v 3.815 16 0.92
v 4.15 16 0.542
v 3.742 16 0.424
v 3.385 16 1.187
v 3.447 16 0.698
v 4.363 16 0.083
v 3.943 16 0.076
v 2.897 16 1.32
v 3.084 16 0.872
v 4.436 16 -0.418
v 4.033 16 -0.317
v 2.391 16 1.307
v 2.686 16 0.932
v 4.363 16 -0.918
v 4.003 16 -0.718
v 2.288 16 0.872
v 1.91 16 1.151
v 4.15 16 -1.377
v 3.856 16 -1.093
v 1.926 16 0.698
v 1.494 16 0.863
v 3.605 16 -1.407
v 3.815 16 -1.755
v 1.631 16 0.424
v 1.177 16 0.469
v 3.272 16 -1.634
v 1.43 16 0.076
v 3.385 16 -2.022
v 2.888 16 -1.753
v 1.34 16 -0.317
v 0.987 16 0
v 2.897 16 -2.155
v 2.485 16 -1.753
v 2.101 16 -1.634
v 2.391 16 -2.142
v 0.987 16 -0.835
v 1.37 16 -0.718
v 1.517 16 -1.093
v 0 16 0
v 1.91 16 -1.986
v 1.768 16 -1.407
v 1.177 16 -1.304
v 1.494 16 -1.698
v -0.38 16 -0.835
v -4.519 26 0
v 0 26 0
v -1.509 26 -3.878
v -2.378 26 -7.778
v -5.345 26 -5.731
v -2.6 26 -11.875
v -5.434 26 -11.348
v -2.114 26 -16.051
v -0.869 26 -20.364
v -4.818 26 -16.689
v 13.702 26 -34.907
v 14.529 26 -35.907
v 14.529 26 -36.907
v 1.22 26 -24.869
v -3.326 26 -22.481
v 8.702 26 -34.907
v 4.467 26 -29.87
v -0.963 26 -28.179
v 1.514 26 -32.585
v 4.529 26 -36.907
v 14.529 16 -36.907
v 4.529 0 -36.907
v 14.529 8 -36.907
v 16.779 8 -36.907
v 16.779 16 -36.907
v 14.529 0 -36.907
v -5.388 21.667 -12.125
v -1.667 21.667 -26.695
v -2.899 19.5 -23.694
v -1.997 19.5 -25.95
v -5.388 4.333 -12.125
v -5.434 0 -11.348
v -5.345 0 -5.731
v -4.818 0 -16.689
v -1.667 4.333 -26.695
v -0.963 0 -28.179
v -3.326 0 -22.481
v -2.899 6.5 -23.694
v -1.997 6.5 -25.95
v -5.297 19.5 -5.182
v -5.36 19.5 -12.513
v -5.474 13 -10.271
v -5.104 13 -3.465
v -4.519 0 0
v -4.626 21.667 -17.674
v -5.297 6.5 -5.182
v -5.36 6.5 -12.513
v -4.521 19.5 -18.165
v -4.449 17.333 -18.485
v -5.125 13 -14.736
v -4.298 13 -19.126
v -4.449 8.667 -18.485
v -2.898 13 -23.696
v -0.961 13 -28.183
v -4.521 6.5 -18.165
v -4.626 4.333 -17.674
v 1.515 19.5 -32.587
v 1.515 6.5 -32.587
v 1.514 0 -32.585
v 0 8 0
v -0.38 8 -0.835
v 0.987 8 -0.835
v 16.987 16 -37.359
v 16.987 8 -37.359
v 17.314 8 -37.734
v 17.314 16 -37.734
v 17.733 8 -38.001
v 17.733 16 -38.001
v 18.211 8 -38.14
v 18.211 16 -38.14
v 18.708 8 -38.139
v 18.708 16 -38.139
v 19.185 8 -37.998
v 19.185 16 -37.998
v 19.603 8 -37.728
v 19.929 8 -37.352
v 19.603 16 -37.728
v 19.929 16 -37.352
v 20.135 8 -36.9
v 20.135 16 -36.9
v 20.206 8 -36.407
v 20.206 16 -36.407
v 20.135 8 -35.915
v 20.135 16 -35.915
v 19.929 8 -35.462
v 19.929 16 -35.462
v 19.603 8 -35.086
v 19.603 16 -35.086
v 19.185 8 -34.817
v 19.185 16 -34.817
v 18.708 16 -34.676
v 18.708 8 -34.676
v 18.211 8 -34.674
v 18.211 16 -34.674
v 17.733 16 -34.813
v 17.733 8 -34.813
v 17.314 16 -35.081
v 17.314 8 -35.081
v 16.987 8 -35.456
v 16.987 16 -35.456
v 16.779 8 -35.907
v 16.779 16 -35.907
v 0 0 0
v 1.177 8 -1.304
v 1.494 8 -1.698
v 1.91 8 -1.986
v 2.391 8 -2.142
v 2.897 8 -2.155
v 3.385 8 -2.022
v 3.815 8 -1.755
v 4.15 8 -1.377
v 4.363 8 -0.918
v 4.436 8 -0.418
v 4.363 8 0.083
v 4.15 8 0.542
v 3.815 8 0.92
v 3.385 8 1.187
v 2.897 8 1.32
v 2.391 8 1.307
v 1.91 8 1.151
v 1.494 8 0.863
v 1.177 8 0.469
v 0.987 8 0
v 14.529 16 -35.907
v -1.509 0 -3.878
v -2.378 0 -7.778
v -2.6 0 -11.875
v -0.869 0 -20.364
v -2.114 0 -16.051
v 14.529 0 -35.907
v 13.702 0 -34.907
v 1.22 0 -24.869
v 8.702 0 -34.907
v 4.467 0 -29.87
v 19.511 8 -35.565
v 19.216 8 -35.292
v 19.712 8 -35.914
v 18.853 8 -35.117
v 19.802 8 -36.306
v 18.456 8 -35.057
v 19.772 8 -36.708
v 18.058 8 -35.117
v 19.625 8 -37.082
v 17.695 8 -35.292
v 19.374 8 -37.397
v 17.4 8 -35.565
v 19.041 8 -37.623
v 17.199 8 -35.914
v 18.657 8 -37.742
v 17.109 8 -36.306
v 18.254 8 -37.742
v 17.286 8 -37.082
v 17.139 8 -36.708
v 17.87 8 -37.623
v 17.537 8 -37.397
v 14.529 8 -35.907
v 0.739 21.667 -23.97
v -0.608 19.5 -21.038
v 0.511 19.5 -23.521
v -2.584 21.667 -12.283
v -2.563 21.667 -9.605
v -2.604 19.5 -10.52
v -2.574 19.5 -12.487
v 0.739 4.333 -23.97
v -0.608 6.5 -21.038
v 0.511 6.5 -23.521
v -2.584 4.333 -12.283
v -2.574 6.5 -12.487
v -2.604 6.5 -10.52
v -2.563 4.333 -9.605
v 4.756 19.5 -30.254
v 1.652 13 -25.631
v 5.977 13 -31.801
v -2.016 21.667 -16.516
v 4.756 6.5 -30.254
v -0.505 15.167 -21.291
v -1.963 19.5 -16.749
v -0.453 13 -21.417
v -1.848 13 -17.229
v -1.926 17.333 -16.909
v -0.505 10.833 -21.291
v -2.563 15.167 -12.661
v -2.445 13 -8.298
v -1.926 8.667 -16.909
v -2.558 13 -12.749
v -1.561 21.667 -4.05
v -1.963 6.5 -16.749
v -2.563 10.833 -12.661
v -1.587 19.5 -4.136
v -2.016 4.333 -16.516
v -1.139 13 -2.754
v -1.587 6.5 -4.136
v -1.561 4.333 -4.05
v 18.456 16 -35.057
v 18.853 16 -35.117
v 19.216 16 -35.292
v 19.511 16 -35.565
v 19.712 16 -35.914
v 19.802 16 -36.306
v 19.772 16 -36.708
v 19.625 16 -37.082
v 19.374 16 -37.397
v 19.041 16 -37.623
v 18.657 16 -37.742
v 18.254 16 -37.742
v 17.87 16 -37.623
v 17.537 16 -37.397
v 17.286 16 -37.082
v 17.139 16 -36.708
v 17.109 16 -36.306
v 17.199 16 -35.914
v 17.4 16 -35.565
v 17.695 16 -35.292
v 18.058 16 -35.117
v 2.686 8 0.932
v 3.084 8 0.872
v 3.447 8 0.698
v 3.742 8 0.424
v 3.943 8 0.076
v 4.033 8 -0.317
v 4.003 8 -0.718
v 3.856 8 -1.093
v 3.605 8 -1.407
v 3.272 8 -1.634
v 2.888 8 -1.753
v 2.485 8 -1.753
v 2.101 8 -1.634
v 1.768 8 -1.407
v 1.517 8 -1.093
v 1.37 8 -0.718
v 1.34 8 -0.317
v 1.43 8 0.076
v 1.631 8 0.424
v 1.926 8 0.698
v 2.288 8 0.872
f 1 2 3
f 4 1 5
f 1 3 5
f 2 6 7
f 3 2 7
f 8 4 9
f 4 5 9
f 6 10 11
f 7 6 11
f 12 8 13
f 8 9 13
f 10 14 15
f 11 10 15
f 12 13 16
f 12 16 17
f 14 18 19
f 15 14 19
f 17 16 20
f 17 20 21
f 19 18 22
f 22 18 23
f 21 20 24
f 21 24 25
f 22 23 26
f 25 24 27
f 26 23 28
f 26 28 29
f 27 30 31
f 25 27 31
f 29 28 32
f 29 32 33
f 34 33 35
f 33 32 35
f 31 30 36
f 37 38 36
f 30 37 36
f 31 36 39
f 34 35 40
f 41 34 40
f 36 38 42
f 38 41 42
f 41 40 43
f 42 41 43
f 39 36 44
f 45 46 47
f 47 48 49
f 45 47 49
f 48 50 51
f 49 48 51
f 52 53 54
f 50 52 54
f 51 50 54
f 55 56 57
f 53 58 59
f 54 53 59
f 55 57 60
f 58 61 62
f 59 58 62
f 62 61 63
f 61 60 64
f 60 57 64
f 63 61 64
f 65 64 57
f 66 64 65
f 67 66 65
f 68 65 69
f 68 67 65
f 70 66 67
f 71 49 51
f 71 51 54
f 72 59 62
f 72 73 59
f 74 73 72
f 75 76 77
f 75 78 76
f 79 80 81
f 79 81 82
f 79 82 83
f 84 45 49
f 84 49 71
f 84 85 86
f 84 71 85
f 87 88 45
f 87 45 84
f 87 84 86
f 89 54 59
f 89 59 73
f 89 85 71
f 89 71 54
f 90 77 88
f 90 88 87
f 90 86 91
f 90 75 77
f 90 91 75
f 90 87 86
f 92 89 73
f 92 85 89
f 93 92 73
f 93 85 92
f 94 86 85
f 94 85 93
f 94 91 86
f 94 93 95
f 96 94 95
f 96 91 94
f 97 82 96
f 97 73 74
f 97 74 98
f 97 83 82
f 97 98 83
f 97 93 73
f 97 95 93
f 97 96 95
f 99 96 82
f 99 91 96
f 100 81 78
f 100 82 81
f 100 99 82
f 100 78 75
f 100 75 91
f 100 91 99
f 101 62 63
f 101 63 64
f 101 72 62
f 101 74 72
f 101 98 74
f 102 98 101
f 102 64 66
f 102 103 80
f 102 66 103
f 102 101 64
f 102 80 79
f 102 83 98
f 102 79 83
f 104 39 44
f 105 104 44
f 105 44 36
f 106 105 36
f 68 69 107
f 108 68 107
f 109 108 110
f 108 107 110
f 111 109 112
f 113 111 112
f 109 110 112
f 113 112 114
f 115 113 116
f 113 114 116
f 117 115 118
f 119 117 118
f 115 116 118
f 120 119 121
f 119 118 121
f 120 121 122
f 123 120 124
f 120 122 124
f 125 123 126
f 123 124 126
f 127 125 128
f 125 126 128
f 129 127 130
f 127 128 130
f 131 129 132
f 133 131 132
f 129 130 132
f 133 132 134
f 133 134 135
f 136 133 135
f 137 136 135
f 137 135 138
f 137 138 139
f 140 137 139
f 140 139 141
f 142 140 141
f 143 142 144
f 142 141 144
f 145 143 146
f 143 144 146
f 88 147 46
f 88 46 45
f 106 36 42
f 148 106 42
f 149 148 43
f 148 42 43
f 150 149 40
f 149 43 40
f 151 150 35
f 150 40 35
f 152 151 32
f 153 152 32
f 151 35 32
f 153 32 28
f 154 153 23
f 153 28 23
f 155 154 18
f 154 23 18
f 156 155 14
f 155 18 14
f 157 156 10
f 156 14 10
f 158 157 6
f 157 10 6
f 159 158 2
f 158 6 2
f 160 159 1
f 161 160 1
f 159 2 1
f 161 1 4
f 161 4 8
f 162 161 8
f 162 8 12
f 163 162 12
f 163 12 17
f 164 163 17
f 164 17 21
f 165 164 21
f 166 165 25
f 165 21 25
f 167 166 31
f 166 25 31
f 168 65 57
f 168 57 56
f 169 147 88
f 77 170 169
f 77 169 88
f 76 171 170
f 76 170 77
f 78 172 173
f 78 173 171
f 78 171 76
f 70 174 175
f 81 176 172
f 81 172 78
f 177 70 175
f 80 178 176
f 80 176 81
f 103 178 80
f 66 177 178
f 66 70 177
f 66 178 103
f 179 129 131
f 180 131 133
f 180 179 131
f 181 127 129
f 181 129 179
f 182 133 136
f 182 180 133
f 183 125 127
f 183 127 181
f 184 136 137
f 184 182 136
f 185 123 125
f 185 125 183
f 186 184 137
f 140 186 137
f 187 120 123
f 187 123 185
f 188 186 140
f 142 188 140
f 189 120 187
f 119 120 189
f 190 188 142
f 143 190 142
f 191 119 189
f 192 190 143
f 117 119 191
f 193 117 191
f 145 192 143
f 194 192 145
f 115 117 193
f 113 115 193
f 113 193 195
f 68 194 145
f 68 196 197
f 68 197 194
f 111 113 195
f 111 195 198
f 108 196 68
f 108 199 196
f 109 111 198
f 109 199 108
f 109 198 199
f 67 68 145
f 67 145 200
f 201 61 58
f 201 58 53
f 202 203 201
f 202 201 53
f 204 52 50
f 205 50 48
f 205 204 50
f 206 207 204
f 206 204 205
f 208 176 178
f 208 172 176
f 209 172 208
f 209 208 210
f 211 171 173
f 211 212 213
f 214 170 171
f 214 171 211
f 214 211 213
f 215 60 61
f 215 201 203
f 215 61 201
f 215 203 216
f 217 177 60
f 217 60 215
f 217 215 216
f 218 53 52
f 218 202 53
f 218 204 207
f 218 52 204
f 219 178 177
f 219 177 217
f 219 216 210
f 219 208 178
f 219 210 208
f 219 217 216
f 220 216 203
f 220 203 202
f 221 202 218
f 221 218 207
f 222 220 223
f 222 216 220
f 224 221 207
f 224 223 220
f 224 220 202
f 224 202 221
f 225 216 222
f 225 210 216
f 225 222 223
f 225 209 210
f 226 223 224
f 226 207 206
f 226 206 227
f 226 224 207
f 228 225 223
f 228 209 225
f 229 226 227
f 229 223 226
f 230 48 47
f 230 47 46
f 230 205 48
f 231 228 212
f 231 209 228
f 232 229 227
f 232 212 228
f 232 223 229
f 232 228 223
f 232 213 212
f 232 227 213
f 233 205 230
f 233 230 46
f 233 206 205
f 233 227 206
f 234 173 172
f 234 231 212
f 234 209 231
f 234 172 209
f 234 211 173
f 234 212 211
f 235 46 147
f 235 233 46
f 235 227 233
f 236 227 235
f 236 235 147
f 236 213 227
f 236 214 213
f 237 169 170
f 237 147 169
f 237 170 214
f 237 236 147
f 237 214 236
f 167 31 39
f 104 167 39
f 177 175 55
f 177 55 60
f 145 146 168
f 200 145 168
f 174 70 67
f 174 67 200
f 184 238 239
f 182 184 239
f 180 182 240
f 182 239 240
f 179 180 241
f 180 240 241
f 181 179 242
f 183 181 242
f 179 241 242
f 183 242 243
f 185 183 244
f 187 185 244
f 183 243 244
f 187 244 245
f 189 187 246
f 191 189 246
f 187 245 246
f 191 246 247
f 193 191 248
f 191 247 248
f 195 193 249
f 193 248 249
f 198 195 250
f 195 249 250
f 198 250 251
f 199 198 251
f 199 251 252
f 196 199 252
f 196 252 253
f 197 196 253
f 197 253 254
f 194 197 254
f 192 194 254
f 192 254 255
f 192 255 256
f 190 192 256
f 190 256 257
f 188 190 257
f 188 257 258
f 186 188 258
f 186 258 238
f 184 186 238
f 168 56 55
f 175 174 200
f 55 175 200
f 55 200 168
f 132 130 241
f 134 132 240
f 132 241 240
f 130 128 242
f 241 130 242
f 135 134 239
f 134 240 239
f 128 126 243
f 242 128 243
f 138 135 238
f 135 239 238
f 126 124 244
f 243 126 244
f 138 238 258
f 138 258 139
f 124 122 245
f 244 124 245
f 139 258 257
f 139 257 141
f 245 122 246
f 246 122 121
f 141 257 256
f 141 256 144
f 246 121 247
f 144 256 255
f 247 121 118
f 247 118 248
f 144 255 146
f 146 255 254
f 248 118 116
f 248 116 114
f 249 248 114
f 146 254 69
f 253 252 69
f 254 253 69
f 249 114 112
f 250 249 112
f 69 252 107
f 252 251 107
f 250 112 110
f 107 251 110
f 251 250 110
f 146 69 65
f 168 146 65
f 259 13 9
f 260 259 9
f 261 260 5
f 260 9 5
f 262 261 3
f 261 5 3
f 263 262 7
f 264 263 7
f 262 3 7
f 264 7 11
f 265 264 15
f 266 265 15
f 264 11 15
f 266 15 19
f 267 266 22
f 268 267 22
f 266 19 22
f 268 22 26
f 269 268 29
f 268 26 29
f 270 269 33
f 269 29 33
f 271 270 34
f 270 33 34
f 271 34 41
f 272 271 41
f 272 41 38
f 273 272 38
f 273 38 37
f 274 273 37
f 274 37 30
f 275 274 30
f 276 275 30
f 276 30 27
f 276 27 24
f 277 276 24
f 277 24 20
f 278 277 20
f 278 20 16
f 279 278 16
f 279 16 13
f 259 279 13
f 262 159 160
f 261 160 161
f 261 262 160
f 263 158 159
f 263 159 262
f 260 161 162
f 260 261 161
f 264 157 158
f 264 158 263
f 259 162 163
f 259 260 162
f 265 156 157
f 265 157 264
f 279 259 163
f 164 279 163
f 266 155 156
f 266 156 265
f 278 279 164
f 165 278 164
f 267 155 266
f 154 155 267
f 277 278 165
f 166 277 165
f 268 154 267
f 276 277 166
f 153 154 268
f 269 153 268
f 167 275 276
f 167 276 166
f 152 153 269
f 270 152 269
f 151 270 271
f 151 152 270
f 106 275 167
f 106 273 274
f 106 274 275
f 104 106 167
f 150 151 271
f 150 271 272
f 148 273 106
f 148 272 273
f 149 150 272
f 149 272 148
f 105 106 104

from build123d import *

# Parameters (mm, degrees)
BOSS_EXTRUDE1_DEPTH = 26
BOSS_EXTRUDE2_START = -10
BOSS_EXTRUDE2_DEPTH = 8
SKETCH3_R           = 1.35
CUT_EXTRUDE1_DEPTH  = 47.046014969
BOSS_EXTRUDE3_START = -10
BOSS_EXTRUDE3_DEPTH = 8
SKETCH5_R           = 1.35
CUT_EXTRUDE2_DEPTH  = 47.046014969


with BuildPart() as part:
    # Sketch1 → Boss-Extrude1 (new body)
    with BuildSketch(Plane(origin=(0, 0, 0), x_dir=(1, 0, 0), z_dir=(0, 1, 0))):
        with BuildLine():
            Line((4.528508304, 36.907186285), (14.528508304, 36.907186285))
            Line((14.528508304, 36.907186285), (14.528508304, 35.907186285))
            Line((14.528508304, 35.907186285), (13.702044813, 34.907186285))
            Line((13.702044813, 34.907186285), (8.702044813, 34.907186285))
            add(Edge.make_bspline(
                [(8.702044813, 34.907186285), (-8.047895334, 17.004513085), (0, 0)],
                knots=[0, 0, 0, 1, 1, 1], degree=2))
            Line((0, 0), (-4.519121247, 0))
            add(Edge.make_bspline(
                [(-4.519121247, 0), (-8.600172805, 19.797575634), (4.528508304, 36.907186285)],
                knots=[0, 0, 0, 1, 1, 1], degree=2))
        make_face()
    extrude(amount=BOSS_EXTRUDE1_DEPTH)

    # Sketch2 → Boss-Extrude2 (add)
    with BuildSketch(Plane(origin=(0, 26, 0), x_dir=(1, 0, 0), z_dir=(0, 1, 0)).offset(BOSS_EXTRUDE2_START)):
        with BuildLine():
            Line((14.528508304, 36.907186285), (16.778508304, 36.907186285))
            ThreePointArc((16.778508304, 36.907186285), (20.205559287, 36.407186285), (16.778508304, 35.907186285))
            Line((16.778508304, 35.907186285), (14.528508304, 35.907186285))
            Line((14.528508304, 35.907186285), (14.528508304, 36.907186285))
        make_face()
    extrude(amount=-BOSS_EXTRUDE2_DEPTH)

    # Sketch3 → Cut-Extrude1 (cut, through all)
    with BuildSketch(Plane(origin=(0, 16, 0), x_dir=(1, 0, 0), z_dir=(0, 1, 0))):
        with Locations(Location((18.455559287, 36.407186285, 0), (0, 0, 270))):
            Circle(SKETCH3_R)
    extrude(amount=-CUT_EXTRUDE1_DEPTH, mode=Mode.SUBTRACT)


with BuildPart() as body_2:
    # Sketch4 → Boss-Extrude3 (new body)
    with BuildSketch(Plane(origin=(0, 26, 0), x_dir=(1, 0, 0), z_dir=(0, 1, 0)).offset(BOSS_EXTRUDE3_START)):
        with BuildLine():
            Line((-0.380093585, 0.835205754), (0.986955671, 0.835205754))
            ThreePointArc((0.986955671, 0.835205754), (4.436399061, 0.417602877), (0.986955671, 0))
            Line((0.986955671, 0), (0, 0))
            Line((0, 0), (-0.380093585, 0.835205754))
        make_face()
    extrude(amount=-BOSS_EXTRUDE3_DEPTH)

    # Sketch5 → Cut-Extrude2 (cut, through all)
    with BuildSketch(Plane(origin=(0, 16, 0), x_dir=(1, 0, 0), z_dir=(0, 1, 0))):
        with Locations(Location((2.686399061, 0.417602877, 0), (0, 0, 270))):
            Circle(SKETCH5_R)
    extrude(amount=-CUT_EXTRUDE2_DEPTH, mode=Mode.SUBTRACT)


solid = Compound([part.part, body_2.part])
